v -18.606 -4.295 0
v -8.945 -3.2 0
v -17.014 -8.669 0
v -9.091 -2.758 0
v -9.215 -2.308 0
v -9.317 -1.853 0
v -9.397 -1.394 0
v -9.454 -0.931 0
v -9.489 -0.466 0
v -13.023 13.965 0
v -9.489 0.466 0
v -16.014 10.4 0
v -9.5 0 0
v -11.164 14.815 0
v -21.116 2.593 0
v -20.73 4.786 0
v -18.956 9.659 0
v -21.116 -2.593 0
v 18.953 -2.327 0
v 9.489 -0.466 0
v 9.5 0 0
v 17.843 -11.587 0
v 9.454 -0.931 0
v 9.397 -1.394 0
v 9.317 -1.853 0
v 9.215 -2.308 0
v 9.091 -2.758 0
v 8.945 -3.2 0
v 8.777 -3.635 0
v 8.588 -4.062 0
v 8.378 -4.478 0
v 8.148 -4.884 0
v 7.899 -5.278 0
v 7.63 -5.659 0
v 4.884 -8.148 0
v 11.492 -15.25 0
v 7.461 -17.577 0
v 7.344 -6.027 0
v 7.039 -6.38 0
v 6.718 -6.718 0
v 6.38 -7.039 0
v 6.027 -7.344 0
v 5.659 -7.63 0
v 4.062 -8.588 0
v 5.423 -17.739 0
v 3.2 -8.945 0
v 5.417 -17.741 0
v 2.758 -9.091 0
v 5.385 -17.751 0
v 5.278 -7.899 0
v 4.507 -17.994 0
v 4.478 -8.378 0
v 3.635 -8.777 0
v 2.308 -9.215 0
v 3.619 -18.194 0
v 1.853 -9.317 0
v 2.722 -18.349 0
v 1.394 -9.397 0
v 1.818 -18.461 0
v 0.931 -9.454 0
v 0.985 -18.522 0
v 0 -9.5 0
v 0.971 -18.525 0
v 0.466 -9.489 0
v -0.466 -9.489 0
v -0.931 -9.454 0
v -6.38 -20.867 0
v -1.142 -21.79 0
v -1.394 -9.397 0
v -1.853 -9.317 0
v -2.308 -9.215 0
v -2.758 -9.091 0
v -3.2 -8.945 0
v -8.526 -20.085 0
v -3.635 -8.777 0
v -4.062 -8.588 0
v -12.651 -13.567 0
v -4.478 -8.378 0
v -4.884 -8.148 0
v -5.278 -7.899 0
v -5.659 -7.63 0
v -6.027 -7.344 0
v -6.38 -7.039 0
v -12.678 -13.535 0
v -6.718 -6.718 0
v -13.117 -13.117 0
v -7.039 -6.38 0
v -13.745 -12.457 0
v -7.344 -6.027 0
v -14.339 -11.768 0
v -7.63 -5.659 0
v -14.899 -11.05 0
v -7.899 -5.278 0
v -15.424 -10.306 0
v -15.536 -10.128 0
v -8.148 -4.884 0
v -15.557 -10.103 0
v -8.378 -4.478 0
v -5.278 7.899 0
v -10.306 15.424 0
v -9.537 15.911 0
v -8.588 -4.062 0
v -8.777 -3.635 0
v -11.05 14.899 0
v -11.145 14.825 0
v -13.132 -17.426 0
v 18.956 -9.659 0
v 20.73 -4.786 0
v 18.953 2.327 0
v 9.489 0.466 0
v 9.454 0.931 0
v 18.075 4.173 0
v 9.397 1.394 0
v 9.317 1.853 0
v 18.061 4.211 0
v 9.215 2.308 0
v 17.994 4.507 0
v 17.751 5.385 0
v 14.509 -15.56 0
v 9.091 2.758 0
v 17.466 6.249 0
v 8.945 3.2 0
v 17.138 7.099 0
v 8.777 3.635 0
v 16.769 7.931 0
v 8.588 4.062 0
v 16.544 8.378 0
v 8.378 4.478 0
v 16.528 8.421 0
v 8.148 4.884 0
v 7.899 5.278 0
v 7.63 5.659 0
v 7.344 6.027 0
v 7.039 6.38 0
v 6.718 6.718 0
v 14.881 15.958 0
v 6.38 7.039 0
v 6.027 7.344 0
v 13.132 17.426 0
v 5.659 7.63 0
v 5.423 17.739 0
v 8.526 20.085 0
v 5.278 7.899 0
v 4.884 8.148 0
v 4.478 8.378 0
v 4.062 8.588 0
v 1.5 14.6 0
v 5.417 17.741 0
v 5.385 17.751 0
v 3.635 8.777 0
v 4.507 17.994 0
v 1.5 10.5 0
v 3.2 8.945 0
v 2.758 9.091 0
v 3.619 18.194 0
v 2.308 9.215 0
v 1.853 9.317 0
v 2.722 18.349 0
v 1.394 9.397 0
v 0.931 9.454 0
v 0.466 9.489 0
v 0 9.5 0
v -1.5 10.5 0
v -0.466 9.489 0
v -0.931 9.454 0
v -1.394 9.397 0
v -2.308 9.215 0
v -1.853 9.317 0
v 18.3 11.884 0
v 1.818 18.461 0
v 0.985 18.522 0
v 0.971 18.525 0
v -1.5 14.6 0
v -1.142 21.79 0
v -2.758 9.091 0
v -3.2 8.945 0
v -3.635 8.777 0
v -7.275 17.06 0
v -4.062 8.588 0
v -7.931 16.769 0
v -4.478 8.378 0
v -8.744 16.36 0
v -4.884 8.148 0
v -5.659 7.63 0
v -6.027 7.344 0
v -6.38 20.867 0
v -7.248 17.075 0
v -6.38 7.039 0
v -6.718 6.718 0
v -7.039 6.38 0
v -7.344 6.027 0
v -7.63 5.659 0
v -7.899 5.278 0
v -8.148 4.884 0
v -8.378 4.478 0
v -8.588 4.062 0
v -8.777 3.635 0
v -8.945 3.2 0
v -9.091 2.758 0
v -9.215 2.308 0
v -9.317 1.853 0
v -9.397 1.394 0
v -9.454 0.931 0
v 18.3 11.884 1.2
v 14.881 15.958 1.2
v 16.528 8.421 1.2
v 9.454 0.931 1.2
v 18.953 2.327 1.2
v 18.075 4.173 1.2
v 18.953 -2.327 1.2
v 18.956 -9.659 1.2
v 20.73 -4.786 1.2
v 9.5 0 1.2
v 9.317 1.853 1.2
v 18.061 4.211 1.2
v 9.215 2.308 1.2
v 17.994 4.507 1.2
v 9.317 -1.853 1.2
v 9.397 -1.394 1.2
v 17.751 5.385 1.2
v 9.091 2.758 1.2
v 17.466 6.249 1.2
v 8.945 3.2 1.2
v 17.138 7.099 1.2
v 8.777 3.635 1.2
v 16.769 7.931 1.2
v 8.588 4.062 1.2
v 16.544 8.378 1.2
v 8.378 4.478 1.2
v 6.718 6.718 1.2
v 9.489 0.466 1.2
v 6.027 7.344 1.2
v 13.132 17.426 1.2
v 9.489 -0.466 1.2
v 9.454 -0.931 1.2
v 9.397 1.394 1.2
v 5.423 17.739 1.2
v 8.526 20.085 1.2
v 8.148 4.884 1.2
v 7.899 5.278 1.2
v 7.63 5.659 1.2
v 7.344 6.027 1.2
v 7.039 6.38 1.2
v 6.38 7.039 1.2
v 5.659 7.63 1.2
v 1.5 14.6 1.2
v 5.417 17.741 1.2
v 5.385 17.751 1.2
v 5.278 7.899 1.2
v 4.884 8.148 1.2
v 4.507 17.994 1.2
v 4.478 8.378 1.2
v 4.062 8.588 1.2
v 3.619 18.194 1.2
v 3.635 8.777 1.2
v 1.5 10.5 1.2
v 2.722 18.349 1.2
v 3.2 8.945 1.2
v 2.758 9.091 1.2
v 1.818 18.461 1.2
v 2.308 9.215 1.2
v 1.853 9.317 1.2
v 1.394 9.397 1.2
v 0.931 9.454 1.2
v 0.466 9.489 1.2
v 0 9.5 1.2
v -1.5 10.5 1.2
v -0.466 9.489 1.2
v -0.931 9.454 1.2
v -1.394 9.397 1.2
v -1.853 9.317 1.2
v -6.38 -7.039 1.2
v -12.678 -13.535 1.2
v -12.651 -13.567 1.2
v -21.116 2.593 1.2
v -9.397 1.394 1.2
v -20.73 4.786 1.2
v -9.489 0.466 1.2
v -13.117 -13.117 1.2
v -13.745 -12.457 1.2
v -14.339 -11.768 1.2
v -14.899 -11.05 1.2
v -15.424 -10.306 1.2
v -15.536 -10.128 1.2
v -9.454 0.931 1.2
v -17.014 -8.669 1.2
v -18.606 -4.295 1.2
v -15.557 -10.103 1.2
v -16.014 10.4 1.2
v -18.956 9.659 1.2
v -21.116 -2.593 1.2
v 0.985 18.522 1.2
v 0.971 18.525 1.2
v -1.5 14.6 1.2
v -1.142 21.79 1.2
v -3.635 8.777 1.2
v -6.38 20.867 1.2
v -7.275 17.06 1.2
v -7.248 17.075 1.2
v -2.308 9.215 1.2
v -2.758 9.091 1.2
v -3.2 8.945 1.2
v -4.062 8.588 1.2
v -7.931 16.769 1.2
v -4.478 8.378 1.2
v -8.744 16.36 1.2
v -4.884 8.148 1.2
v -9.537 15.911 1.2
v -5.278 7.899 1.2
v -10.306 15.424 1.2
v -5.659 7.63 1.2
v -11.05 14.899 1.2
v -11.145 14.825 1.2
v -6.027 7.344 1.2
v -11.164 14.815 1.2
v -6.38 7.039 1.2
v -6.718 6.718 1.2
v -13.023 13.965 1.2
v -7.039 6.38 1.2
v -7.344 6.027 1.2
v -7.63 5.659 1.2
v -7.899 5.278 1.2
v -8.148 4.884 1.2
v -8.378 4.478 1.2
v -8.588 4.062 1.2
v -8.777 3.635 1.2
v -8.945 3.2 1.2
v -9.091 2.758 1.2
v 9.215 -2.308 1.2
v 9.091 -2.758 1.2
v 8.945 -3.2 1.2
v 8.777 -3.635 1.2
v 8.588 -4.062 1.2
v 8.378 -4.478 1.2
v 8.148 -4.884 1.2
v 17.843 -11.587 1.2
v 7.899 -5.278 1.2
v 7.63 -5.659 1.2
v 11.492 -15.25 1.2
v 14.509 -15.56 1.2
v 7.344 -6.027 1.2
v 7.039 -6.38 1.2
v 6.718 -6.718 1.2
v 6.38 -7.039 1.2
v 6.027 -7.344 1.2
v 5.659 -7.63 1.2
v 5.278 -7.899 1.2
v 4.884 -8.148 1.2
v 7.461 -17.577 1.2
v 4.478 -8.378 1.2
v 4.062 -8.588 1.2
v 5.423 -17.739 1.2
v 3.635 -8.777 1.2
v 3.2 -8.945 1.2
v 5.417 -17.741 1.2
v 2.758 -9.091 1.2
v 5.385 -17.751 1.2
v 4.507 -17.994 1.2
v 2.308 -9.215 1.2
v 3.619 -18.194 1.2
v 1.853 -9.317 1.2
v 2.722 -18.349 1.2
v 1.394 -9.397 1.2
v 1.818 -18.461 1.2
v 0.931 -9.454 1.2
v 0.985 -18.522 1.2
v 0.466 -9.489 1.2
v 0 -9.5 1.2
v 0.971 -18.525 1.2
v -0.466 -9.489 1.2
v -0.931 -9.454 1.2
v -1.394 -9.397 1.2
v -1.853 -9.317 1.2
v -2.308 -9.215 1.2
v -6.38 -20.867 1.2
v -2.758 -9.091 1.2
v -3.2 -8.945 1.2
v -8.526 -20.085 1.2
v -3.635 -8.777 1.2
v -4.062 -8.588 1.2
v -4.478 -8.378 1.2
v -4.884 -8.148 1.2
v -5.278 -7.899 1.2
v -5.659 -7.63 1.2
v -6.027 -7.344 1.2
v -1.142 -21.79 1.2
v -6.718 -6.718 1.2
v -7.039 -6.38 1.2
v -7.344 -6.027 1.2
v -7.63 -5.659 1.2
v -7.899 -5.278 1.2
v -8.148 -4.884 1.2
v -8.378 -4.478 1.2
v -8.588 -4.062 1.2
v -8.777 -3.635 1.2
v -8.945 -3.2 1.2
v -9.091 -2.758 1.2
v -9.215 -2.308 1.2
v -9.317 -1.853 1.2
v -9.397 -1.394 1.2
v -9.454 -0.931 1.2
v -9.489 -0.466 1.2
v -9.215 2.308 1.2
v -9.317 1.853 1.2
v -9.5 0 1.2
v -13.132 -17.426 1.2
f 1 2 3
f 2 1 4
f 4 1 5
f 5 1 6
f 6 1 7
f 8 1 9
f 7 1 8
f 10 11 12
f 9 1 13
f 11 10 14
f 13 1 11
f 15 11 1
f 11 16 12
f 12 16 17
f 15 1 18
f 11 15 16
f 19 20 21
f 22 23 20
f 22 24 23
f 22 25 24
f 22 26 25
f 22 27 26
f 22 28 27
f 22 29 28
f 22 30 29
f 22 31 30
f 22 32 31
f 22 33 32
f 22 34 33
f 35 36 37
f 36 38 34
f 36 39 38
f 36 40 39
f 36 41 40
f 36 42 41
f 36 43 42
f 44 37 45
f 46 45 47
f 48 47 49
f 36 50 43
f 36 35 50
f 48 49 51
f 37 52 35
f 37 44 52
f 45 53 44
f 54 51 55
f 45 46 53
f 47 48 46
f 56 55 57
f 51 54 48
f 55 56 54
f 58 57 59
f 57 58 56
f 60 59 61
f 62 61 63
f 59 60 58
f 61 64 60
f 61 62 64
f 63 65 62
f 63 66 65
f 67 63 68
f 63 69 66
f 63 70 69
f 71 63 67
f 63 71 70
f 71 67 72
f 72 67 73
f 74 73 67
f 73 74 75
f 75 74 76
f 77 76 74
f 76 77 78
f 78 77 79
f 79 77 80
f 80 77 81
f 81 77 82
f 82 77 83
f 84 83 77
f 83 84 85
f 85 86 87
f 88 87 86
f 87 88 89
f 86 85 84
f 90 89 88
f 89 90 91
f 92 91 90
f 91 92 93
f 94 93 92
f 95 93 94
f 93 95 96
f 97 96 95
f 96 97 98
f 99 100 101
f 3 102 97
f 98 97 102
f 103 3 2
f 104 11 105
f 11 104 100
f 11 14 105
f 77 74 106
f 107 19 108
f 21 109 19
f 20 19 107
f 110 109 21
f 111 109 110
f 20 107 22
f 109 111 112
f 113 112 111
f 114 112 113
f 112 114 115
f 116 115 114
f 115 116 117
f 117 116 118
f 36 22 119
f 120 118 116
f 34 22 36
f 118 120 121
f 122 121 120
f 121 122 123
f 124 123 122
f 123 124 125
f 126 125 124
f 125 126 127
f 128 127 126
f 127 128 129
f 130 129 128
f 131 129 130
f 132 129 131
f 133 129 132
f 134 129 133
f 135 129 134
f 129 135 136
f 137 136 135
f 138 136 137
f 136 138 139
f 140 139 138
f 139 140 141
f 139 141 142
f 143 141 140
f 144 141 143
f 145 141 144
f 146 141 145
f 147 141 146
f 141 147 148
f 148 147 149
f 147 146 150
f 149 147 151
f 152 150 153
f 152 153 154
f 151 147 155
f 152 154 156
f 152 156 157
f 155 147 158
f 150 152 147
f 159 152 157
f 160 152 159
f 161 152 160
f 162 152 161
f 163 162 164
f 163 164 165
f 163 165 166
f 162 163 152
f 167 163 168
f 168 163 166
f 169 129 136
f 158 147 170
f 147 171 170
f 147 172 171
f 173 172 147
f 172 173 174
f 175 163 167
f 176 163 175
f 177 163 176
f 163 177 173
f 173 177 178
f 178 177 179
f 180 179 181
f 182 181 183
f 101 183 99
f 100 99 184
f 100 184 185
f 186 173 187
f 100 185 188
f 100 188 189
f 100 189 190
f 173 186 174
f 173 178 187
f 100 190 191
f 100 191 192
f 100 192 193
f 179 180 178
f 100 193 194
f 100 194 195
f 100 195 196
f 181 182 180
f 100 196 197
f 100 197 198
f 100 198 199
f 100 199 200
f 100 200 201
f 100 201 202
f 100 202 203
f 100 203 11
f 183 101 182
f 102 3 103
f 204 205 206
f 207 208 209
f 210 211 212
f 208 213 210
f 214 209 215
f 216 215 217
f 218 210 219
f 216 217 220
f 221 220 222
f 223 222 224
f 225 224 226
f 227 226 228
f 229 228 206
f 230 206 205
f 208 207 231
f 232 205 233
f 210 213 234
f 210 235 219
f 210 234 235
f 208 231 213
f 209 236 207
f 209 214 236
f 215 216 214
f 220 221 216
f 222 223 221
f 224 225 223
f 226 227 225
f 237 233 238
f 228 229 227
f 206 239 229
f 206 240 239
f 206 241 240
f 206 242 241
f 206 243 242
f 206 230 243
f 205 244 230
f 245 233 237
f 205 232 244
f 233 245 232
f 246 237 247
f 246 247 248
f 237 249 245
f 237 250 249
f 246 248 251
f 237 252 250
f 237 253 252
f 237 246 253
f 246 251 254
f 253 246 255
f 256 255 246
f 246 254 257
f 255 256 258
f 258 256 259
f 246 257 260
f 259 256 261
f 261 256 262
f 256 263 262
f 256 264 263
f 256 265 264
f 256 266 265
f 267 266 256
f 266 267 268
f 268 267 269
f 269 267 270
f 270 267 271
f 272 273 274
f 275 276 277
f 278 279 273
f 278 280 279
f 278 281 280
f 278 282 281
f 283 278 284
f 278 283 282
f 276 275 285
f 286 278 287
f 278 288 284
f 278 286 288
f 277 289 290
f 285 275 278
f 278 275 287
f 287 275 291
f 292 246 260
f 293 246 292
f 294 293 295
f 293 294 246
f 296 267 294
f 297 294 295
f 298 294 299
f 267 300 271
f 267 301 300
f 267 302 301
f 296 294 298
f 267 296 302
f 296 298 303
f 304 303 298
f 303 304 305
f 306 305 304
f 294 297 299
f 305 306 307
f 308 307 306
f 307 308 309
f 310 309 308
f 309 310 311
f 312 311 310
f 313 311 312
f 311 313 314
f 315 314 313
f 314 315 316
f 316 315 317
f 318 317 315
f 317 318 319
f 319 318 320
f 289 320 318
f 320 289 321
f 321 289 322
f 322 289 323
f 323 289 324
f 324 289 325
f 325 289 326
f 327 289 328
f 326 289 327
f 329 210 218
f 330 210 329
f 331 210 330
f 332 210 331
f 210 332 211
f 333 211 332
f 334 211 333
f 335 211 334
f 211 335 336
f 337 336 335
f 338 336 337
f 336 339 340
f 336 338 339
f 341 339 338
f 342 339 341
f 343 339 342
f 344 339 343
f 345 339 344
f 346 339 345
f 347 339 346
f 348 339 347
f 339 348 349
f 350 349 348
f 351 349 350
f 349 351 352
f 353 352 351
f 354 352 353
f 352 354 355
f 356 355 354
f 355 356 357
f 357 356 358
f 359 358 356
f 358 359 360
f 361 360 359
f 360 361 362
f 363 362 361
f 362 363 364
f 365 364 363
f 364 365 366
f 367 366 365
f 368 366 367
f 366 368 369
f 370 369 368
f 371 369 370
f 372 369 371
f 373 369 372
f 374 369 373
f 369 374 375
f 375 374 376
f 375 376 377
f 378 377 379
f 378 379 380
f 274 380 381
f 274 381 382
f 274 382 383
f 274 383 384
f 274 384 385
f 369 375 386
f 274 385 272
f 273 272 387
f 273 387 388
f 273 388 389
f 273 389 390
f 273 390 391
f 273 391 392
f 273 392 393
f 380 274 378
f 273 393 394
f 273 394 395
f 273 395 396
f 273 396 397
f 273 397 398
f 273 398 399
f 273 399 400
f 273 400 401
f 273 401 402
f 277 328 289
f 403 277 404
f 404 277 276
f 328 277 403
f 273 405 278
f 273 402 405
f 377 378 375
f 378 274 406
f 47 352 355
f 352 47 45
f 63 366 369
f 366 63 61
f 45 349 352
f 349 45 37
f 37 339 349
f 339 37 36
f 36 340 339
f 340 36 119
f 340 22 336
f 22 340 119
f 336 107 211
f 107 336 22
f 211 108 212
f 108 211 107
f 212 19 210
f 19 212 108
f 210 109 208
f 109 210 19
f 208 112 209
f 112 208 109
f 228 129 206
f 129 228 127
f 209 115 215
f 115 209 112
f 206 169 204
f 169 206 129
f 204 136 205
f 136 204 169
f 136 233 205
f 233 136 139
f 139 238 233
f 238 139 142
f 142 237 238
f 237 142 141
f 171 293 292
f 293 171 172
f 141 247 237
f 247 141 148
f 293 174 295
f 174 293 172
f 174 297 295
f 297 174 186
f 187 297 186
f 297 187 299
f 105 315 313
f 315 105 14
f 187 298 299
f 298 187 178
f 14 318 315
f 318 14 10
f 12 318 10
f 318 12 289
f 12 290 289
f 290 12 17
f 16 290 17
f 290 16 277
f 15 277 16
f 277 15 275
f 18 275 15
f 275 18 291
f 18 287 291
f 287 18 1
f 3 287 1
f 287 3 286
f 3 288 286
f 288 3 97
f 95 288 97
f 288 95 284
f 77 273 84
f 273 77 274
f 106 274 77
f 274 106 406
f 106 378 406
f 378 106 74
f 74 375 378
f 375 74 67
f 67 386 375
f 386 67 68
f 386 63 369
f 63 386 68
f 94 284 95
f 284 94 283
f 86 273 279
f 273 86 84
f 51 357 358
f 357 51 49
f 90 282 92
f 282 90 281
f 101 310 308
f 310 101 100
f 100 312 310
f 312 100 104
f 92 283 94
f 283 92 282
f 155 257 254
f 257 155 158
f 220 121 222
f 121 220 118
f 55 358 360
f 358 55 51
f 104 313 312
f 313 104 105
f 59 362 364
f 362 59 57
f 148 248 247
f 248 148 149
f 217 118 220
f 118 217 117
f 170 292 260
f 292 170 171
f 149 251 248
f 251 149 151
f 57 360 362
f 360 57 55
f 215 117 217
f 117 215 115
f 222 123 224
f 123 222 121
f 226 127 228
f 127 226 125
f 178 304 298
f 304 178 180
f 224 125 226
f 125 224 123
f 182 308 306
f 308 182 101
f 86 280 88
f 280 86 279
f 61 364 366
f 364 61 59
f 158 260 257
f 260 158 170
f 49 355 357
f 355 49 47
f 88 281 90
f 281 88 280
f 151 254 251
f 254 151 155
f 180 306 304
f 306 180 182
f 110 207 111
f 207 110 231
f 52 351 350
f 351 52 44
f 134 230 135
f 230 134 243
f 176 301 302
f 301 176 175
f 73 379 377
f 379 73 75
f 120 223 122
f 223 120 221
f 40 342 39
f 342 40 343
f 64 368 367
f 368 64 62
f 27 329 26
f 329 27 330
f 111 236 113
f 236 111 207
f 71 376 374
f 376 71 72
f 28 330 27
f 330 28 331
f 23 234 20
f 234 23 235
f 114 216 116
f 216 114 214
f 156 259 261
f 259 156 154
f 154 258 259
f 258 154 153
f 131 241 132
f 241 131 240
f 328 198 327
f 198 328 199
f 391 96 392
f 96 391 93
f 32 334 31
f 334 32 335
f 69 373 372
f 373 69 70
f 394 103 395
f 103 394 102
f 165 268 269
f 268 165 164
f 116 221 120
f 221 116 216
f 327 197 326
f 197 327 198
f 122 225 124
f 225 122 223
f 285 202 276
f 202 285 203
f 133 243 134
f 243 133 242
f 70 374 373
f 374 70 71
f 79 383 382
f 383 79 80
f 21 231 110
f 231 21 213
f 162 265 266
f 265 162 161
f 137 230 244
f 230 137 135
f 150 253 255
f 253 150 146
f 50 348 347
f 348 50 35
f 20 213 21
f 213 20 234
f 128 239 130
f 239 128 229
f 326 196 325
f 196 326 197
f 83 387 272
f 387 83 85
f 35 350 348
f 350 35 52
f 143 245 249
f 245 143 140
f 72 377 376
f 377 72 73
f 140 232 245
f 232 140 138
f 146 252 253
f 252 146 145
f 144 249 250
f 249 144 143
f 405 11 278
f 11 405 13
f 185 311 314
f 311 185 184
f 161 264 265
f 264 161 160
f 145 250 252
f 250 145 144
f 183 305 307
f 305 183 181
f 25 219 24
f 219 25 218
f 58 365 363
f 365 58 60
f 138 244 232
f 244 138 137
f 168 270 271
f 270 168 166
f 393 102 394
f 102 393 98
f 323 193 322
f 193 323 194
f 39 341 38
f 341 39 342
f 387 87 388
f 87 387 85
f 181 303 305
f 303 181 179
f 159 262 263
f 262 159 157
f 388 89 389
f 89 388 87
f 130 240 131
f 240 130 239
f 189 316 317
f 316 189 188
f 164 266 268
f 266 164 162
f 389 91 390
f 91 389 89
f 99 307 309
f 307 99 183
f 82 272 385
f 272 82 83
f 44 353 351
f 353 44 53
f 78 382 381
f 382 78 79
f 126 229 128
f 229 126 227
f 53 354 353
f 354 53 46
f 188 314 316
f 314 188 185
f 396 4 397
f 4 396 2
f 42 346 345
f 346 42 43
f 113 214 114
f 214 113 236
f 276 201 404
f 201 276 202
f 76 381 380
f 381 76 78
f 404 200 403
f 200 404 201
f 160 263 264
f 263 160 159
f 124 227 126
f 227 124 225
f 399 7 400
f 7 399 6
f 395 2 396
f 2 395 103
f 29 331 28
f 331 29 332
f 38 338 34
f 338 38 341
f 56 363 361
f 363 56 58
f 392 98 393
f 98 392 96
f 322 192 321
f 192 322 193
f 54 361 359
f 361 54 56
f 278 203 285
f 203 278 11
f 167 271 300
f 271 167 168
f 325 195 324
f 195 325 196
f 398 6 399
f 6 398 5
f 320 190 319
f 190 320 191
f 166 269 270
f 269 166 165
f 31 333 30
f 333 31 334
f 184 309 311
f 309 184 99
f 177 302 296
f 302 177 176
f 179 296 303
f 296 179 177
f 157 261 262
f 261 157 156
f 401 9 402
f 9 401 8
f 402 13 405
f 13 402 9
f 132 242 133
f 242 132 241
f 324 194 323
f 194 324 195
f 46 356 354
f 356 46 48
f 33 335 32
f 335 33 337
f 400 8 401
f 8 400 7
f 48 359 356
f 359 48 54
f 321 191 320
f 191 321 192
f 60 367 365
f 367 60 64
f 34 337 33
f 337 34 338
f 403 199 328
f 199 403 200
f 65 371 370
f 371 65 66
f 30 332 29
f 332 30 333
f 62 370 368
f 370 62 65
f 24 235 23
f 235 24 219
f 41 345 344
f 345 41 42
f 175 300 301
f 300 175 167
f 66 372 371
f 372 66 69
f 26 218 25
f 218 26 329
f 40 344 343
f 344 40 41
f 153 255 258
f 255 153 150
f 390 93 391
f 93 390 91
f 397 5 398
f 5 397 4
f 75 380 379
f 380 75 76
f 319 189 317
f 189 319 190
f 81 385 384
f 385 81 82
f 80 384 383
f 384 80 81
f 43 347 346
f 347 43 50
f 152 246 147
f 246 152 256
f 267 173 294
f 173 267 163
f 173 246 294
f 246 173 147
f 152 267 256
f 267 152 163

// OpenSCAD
/*
  Elna Supermatic cam 34
  Name: Extra decorative
  Status: candidate

  Generated from measured parametric base v2.
  Surface mode: stepped
*/

include <_elna_measured_common.scad>;

profile_points = [
        [0.9708, 18.5246],
        [5.4235, 17.7395],
        [8.5258, 20.0854],
        [13.1316, 17.4262],
        [14.8812, 15.9581],
        [18.2998, 11.8840],
        [16.5282, 8.4215],
        [18.0746, 4.1728],
        [18.9527, 2.3271],
        [18.9527, -2.3271],
        [20.7297, -4.7858],
        [18.9562, -9.6586],
        [17.8427, -11.5872],
        [14.5095, -15.5596],
        [11.4917, -15.2499],
        [7.4610, -17.5770],
        [5.4235, -17.7395],
        [0.9708, -18.5246],
        [-1.1420, -21.7901],
        [-6.3796, -20.8666],
        [-8.5258, -20.0854],
        [-13.1316, -17.4262],
        [-12.6511, -13.5666],
        [-15.5573, -10.1031],
        [-17.0138, -8.6689],
        [-18.6056, -4.2954],
        [-21.1164, -2.5928],
        [-21.1164, 2.5928],
        [-20.7297, 4.7858],
        [-18.9562, 9.6586],
        [-16.0144, 10.3999],
        [-13.0228, 13.9652],
        [-11.1637, 14.8147],
        [-7.2481, 17.0754],
        [-6.3796, 20.8666],
        [-1.1420, 21.7901]
];

icon_points = [[-1.000,0.180], [-0.750,0.820], [-0.500,0.180], [-0.250,0.820], [0.000,0.180], [0.250,0.820], [0.500,0.180], [0.750,0.820], [1.000,0.180]];

elna_cam_ring(profile_points=profile_points);
